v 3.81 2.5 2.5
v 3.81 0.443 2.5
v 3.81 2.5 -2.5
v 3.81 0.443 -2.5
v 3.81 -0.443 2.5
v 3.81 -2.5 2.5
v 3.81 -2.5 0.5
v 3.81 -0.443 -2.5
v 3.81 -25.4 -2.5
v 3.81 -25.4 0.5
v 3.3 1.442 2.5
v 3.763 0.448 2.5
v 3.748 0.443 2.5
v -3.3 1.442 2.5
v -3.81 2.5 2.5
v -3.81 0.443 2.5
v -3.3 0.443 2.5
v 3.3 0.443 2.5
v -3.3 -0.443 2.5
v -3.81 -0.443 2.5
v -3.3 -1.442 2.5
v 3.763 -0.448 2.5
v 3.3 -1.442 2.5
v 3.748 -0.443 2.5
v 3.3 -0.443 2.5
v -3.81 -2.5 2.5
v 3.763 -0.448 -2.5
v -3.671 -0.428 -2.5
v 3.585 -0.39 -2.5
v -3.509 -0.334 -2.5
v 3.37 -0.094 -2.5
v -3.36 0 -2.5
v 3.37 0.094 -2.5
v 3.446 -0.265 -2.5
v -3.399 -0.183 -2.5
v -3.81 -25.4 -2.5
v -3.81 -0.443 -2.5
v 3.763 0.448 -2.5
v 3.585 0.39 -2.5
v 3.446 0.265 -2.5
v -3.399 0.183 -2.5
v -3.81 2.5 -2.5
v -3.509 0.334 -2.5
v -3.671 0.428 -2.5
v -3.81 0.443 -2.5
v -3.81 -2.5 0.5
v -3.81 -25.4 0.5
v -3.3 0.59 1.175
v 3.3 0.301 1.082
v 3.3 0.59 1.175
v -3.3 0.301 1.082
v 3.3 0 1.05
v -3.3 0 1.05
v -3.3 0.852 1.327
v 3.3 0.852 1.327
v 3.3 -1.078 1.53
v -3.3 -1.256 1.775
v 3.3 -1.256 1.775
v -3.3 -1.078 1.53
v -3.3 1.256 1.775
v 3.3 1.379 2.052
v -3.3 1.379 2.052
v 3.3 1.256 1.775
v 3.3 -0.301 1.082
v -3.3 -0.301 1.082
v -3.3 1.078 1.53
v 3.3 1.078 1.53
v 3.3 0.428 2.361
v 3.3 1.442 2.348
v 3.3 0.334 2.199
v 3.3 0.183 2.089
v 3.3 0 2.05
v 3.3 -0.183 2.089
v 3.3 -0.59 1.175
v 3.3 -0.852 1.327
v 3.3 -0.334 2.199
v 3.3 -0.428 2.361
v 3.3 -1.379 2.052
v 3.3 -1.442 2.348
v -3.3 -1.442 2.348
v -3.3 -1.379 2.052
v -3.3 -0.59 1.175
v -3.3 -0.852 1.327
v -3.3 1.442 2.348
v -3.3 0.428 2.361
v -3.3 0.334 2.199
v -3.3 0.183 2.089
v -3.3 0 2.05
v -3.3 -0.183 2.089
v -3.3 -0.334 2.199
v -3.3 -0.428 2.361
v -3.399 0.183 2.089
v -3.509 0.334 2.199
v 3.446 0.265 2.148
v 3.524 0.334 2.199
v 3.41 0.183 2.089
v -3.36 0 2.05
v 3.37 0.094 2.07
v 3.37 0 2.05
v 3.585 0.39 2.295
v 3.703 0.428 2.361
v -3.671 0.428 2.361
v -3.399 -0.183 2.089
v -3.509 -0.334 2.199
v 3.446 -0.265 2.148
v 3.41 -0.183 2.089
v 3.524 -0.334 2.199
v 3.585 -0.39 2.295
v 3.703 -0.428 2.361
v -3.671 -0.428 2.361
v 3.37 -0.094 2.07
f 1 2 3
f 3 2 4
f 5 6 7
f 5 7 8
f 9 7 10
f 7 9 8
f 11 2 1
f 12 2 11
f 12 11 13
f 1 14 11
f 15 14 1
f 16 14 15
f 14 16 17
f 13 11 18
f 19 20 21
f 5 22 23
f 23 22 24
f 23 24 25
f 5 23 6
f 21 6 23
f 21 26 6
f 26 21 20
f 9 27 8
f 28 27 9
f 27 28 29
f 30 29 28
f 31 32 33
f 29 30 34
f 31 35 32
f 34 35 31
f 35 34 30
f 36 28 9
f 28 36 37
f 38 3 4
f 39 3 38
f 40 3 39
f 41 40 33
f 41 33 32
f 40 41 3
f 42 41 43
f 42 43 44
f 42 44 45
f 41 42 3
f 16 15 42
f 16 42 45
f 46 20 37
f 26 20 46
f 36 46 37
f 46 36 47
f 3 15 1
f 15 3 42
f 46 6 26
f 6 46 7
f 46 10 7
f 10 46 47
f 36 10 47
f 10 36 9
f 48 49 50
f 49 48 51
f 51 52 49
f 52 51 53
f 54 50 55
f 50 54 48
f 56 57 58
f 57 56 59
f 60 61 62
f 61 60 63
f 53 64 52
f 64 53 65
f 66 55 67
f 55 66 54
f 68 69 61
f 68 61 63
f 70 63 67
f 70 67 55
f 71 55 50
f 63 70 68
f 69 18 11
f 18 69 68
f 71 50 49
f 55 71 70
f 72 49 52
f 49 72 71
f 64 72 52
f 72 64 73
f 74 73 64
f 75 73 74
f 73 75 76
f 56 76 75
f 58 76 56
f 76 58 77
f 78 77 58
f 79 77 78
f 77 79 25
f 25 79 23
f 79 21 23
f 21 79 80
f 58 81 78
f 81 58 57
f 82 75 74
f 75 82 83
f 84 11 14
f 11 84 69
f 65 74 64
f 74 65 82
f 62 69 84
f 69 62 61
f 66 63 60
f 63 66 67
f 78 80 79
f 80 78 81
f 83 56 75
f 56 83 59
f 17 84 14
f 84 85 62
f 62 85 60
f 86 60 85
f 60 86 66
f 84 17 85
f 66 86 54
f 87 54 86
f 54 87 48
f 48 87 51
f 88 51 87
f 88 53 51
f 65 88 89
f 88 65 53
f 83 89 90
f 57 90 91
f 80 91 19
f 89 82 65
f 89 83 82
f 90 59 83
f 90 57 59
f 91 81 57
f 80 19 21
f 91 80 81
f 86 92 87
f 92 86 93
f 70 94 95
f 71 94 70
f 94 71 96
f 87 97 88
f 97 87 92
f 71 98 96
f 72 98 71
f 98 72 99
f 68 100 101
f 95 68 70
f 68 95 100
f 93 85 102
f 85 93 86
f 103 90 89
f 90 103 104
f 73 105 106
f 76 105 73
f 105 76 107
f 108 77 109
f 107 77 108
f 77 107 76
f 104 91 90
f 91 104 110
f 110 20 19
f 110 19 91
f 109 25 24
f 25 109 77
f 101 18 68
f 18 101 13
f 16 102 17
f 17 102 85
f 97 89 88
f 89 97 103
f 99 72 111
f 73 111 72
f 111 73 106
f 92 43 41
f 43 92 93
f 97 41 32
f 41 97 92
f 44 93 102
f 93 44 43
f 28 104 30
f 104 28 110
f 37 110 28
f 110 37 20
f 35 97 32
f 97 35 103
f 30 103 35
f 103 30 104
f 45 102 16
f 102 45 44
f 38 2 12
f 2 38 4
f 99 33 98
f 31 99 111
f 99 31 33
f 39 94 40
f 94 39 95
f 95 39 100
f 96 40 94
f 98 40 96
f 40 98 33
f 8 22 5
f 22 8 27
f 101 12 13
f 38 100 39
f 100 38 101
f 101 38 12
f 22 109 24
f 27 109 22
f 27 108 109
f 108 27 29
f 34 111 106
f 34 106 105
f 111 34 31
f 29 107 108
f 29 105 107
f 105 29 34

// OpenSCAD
module axial_lead_bender(l=6.2, d=2.5, pitch=7.62, lead_d=0.5, nozzle_d=0.4) {
    h = max(5, d/2 + 1.5);
    difference() {
        union() {
            cube([pitch, h, h], center=true);
            translate([-pitch/2, -25.4, -h/2]) cube([pitch, 25.4, 3]);
        }
        translate([0, 0, h/2]) rotate([0, 90, 0]) {
            cylinder(h=l + nozzle_d, d=d+nozzle_d, center=true, $fs=nozzle_d/2);
            cylinder(h=pitch+1, d=lead_d+nozzle_d, center=true, $fs=nozzle_d/2);
        }
        translate([-pitch/2, 0, 0])
            cylinder(h=h+1, d=lead_d+nozzle_d, center=true, $fs=nozzle_d/2);
        translate([ pitch/2, 0, 0])
            cylinder(h=h+1, d=lead_d+nozzle_d, center=true, $fs=nozzle_d/2);
        
    }
}

axial_lead_bender();
